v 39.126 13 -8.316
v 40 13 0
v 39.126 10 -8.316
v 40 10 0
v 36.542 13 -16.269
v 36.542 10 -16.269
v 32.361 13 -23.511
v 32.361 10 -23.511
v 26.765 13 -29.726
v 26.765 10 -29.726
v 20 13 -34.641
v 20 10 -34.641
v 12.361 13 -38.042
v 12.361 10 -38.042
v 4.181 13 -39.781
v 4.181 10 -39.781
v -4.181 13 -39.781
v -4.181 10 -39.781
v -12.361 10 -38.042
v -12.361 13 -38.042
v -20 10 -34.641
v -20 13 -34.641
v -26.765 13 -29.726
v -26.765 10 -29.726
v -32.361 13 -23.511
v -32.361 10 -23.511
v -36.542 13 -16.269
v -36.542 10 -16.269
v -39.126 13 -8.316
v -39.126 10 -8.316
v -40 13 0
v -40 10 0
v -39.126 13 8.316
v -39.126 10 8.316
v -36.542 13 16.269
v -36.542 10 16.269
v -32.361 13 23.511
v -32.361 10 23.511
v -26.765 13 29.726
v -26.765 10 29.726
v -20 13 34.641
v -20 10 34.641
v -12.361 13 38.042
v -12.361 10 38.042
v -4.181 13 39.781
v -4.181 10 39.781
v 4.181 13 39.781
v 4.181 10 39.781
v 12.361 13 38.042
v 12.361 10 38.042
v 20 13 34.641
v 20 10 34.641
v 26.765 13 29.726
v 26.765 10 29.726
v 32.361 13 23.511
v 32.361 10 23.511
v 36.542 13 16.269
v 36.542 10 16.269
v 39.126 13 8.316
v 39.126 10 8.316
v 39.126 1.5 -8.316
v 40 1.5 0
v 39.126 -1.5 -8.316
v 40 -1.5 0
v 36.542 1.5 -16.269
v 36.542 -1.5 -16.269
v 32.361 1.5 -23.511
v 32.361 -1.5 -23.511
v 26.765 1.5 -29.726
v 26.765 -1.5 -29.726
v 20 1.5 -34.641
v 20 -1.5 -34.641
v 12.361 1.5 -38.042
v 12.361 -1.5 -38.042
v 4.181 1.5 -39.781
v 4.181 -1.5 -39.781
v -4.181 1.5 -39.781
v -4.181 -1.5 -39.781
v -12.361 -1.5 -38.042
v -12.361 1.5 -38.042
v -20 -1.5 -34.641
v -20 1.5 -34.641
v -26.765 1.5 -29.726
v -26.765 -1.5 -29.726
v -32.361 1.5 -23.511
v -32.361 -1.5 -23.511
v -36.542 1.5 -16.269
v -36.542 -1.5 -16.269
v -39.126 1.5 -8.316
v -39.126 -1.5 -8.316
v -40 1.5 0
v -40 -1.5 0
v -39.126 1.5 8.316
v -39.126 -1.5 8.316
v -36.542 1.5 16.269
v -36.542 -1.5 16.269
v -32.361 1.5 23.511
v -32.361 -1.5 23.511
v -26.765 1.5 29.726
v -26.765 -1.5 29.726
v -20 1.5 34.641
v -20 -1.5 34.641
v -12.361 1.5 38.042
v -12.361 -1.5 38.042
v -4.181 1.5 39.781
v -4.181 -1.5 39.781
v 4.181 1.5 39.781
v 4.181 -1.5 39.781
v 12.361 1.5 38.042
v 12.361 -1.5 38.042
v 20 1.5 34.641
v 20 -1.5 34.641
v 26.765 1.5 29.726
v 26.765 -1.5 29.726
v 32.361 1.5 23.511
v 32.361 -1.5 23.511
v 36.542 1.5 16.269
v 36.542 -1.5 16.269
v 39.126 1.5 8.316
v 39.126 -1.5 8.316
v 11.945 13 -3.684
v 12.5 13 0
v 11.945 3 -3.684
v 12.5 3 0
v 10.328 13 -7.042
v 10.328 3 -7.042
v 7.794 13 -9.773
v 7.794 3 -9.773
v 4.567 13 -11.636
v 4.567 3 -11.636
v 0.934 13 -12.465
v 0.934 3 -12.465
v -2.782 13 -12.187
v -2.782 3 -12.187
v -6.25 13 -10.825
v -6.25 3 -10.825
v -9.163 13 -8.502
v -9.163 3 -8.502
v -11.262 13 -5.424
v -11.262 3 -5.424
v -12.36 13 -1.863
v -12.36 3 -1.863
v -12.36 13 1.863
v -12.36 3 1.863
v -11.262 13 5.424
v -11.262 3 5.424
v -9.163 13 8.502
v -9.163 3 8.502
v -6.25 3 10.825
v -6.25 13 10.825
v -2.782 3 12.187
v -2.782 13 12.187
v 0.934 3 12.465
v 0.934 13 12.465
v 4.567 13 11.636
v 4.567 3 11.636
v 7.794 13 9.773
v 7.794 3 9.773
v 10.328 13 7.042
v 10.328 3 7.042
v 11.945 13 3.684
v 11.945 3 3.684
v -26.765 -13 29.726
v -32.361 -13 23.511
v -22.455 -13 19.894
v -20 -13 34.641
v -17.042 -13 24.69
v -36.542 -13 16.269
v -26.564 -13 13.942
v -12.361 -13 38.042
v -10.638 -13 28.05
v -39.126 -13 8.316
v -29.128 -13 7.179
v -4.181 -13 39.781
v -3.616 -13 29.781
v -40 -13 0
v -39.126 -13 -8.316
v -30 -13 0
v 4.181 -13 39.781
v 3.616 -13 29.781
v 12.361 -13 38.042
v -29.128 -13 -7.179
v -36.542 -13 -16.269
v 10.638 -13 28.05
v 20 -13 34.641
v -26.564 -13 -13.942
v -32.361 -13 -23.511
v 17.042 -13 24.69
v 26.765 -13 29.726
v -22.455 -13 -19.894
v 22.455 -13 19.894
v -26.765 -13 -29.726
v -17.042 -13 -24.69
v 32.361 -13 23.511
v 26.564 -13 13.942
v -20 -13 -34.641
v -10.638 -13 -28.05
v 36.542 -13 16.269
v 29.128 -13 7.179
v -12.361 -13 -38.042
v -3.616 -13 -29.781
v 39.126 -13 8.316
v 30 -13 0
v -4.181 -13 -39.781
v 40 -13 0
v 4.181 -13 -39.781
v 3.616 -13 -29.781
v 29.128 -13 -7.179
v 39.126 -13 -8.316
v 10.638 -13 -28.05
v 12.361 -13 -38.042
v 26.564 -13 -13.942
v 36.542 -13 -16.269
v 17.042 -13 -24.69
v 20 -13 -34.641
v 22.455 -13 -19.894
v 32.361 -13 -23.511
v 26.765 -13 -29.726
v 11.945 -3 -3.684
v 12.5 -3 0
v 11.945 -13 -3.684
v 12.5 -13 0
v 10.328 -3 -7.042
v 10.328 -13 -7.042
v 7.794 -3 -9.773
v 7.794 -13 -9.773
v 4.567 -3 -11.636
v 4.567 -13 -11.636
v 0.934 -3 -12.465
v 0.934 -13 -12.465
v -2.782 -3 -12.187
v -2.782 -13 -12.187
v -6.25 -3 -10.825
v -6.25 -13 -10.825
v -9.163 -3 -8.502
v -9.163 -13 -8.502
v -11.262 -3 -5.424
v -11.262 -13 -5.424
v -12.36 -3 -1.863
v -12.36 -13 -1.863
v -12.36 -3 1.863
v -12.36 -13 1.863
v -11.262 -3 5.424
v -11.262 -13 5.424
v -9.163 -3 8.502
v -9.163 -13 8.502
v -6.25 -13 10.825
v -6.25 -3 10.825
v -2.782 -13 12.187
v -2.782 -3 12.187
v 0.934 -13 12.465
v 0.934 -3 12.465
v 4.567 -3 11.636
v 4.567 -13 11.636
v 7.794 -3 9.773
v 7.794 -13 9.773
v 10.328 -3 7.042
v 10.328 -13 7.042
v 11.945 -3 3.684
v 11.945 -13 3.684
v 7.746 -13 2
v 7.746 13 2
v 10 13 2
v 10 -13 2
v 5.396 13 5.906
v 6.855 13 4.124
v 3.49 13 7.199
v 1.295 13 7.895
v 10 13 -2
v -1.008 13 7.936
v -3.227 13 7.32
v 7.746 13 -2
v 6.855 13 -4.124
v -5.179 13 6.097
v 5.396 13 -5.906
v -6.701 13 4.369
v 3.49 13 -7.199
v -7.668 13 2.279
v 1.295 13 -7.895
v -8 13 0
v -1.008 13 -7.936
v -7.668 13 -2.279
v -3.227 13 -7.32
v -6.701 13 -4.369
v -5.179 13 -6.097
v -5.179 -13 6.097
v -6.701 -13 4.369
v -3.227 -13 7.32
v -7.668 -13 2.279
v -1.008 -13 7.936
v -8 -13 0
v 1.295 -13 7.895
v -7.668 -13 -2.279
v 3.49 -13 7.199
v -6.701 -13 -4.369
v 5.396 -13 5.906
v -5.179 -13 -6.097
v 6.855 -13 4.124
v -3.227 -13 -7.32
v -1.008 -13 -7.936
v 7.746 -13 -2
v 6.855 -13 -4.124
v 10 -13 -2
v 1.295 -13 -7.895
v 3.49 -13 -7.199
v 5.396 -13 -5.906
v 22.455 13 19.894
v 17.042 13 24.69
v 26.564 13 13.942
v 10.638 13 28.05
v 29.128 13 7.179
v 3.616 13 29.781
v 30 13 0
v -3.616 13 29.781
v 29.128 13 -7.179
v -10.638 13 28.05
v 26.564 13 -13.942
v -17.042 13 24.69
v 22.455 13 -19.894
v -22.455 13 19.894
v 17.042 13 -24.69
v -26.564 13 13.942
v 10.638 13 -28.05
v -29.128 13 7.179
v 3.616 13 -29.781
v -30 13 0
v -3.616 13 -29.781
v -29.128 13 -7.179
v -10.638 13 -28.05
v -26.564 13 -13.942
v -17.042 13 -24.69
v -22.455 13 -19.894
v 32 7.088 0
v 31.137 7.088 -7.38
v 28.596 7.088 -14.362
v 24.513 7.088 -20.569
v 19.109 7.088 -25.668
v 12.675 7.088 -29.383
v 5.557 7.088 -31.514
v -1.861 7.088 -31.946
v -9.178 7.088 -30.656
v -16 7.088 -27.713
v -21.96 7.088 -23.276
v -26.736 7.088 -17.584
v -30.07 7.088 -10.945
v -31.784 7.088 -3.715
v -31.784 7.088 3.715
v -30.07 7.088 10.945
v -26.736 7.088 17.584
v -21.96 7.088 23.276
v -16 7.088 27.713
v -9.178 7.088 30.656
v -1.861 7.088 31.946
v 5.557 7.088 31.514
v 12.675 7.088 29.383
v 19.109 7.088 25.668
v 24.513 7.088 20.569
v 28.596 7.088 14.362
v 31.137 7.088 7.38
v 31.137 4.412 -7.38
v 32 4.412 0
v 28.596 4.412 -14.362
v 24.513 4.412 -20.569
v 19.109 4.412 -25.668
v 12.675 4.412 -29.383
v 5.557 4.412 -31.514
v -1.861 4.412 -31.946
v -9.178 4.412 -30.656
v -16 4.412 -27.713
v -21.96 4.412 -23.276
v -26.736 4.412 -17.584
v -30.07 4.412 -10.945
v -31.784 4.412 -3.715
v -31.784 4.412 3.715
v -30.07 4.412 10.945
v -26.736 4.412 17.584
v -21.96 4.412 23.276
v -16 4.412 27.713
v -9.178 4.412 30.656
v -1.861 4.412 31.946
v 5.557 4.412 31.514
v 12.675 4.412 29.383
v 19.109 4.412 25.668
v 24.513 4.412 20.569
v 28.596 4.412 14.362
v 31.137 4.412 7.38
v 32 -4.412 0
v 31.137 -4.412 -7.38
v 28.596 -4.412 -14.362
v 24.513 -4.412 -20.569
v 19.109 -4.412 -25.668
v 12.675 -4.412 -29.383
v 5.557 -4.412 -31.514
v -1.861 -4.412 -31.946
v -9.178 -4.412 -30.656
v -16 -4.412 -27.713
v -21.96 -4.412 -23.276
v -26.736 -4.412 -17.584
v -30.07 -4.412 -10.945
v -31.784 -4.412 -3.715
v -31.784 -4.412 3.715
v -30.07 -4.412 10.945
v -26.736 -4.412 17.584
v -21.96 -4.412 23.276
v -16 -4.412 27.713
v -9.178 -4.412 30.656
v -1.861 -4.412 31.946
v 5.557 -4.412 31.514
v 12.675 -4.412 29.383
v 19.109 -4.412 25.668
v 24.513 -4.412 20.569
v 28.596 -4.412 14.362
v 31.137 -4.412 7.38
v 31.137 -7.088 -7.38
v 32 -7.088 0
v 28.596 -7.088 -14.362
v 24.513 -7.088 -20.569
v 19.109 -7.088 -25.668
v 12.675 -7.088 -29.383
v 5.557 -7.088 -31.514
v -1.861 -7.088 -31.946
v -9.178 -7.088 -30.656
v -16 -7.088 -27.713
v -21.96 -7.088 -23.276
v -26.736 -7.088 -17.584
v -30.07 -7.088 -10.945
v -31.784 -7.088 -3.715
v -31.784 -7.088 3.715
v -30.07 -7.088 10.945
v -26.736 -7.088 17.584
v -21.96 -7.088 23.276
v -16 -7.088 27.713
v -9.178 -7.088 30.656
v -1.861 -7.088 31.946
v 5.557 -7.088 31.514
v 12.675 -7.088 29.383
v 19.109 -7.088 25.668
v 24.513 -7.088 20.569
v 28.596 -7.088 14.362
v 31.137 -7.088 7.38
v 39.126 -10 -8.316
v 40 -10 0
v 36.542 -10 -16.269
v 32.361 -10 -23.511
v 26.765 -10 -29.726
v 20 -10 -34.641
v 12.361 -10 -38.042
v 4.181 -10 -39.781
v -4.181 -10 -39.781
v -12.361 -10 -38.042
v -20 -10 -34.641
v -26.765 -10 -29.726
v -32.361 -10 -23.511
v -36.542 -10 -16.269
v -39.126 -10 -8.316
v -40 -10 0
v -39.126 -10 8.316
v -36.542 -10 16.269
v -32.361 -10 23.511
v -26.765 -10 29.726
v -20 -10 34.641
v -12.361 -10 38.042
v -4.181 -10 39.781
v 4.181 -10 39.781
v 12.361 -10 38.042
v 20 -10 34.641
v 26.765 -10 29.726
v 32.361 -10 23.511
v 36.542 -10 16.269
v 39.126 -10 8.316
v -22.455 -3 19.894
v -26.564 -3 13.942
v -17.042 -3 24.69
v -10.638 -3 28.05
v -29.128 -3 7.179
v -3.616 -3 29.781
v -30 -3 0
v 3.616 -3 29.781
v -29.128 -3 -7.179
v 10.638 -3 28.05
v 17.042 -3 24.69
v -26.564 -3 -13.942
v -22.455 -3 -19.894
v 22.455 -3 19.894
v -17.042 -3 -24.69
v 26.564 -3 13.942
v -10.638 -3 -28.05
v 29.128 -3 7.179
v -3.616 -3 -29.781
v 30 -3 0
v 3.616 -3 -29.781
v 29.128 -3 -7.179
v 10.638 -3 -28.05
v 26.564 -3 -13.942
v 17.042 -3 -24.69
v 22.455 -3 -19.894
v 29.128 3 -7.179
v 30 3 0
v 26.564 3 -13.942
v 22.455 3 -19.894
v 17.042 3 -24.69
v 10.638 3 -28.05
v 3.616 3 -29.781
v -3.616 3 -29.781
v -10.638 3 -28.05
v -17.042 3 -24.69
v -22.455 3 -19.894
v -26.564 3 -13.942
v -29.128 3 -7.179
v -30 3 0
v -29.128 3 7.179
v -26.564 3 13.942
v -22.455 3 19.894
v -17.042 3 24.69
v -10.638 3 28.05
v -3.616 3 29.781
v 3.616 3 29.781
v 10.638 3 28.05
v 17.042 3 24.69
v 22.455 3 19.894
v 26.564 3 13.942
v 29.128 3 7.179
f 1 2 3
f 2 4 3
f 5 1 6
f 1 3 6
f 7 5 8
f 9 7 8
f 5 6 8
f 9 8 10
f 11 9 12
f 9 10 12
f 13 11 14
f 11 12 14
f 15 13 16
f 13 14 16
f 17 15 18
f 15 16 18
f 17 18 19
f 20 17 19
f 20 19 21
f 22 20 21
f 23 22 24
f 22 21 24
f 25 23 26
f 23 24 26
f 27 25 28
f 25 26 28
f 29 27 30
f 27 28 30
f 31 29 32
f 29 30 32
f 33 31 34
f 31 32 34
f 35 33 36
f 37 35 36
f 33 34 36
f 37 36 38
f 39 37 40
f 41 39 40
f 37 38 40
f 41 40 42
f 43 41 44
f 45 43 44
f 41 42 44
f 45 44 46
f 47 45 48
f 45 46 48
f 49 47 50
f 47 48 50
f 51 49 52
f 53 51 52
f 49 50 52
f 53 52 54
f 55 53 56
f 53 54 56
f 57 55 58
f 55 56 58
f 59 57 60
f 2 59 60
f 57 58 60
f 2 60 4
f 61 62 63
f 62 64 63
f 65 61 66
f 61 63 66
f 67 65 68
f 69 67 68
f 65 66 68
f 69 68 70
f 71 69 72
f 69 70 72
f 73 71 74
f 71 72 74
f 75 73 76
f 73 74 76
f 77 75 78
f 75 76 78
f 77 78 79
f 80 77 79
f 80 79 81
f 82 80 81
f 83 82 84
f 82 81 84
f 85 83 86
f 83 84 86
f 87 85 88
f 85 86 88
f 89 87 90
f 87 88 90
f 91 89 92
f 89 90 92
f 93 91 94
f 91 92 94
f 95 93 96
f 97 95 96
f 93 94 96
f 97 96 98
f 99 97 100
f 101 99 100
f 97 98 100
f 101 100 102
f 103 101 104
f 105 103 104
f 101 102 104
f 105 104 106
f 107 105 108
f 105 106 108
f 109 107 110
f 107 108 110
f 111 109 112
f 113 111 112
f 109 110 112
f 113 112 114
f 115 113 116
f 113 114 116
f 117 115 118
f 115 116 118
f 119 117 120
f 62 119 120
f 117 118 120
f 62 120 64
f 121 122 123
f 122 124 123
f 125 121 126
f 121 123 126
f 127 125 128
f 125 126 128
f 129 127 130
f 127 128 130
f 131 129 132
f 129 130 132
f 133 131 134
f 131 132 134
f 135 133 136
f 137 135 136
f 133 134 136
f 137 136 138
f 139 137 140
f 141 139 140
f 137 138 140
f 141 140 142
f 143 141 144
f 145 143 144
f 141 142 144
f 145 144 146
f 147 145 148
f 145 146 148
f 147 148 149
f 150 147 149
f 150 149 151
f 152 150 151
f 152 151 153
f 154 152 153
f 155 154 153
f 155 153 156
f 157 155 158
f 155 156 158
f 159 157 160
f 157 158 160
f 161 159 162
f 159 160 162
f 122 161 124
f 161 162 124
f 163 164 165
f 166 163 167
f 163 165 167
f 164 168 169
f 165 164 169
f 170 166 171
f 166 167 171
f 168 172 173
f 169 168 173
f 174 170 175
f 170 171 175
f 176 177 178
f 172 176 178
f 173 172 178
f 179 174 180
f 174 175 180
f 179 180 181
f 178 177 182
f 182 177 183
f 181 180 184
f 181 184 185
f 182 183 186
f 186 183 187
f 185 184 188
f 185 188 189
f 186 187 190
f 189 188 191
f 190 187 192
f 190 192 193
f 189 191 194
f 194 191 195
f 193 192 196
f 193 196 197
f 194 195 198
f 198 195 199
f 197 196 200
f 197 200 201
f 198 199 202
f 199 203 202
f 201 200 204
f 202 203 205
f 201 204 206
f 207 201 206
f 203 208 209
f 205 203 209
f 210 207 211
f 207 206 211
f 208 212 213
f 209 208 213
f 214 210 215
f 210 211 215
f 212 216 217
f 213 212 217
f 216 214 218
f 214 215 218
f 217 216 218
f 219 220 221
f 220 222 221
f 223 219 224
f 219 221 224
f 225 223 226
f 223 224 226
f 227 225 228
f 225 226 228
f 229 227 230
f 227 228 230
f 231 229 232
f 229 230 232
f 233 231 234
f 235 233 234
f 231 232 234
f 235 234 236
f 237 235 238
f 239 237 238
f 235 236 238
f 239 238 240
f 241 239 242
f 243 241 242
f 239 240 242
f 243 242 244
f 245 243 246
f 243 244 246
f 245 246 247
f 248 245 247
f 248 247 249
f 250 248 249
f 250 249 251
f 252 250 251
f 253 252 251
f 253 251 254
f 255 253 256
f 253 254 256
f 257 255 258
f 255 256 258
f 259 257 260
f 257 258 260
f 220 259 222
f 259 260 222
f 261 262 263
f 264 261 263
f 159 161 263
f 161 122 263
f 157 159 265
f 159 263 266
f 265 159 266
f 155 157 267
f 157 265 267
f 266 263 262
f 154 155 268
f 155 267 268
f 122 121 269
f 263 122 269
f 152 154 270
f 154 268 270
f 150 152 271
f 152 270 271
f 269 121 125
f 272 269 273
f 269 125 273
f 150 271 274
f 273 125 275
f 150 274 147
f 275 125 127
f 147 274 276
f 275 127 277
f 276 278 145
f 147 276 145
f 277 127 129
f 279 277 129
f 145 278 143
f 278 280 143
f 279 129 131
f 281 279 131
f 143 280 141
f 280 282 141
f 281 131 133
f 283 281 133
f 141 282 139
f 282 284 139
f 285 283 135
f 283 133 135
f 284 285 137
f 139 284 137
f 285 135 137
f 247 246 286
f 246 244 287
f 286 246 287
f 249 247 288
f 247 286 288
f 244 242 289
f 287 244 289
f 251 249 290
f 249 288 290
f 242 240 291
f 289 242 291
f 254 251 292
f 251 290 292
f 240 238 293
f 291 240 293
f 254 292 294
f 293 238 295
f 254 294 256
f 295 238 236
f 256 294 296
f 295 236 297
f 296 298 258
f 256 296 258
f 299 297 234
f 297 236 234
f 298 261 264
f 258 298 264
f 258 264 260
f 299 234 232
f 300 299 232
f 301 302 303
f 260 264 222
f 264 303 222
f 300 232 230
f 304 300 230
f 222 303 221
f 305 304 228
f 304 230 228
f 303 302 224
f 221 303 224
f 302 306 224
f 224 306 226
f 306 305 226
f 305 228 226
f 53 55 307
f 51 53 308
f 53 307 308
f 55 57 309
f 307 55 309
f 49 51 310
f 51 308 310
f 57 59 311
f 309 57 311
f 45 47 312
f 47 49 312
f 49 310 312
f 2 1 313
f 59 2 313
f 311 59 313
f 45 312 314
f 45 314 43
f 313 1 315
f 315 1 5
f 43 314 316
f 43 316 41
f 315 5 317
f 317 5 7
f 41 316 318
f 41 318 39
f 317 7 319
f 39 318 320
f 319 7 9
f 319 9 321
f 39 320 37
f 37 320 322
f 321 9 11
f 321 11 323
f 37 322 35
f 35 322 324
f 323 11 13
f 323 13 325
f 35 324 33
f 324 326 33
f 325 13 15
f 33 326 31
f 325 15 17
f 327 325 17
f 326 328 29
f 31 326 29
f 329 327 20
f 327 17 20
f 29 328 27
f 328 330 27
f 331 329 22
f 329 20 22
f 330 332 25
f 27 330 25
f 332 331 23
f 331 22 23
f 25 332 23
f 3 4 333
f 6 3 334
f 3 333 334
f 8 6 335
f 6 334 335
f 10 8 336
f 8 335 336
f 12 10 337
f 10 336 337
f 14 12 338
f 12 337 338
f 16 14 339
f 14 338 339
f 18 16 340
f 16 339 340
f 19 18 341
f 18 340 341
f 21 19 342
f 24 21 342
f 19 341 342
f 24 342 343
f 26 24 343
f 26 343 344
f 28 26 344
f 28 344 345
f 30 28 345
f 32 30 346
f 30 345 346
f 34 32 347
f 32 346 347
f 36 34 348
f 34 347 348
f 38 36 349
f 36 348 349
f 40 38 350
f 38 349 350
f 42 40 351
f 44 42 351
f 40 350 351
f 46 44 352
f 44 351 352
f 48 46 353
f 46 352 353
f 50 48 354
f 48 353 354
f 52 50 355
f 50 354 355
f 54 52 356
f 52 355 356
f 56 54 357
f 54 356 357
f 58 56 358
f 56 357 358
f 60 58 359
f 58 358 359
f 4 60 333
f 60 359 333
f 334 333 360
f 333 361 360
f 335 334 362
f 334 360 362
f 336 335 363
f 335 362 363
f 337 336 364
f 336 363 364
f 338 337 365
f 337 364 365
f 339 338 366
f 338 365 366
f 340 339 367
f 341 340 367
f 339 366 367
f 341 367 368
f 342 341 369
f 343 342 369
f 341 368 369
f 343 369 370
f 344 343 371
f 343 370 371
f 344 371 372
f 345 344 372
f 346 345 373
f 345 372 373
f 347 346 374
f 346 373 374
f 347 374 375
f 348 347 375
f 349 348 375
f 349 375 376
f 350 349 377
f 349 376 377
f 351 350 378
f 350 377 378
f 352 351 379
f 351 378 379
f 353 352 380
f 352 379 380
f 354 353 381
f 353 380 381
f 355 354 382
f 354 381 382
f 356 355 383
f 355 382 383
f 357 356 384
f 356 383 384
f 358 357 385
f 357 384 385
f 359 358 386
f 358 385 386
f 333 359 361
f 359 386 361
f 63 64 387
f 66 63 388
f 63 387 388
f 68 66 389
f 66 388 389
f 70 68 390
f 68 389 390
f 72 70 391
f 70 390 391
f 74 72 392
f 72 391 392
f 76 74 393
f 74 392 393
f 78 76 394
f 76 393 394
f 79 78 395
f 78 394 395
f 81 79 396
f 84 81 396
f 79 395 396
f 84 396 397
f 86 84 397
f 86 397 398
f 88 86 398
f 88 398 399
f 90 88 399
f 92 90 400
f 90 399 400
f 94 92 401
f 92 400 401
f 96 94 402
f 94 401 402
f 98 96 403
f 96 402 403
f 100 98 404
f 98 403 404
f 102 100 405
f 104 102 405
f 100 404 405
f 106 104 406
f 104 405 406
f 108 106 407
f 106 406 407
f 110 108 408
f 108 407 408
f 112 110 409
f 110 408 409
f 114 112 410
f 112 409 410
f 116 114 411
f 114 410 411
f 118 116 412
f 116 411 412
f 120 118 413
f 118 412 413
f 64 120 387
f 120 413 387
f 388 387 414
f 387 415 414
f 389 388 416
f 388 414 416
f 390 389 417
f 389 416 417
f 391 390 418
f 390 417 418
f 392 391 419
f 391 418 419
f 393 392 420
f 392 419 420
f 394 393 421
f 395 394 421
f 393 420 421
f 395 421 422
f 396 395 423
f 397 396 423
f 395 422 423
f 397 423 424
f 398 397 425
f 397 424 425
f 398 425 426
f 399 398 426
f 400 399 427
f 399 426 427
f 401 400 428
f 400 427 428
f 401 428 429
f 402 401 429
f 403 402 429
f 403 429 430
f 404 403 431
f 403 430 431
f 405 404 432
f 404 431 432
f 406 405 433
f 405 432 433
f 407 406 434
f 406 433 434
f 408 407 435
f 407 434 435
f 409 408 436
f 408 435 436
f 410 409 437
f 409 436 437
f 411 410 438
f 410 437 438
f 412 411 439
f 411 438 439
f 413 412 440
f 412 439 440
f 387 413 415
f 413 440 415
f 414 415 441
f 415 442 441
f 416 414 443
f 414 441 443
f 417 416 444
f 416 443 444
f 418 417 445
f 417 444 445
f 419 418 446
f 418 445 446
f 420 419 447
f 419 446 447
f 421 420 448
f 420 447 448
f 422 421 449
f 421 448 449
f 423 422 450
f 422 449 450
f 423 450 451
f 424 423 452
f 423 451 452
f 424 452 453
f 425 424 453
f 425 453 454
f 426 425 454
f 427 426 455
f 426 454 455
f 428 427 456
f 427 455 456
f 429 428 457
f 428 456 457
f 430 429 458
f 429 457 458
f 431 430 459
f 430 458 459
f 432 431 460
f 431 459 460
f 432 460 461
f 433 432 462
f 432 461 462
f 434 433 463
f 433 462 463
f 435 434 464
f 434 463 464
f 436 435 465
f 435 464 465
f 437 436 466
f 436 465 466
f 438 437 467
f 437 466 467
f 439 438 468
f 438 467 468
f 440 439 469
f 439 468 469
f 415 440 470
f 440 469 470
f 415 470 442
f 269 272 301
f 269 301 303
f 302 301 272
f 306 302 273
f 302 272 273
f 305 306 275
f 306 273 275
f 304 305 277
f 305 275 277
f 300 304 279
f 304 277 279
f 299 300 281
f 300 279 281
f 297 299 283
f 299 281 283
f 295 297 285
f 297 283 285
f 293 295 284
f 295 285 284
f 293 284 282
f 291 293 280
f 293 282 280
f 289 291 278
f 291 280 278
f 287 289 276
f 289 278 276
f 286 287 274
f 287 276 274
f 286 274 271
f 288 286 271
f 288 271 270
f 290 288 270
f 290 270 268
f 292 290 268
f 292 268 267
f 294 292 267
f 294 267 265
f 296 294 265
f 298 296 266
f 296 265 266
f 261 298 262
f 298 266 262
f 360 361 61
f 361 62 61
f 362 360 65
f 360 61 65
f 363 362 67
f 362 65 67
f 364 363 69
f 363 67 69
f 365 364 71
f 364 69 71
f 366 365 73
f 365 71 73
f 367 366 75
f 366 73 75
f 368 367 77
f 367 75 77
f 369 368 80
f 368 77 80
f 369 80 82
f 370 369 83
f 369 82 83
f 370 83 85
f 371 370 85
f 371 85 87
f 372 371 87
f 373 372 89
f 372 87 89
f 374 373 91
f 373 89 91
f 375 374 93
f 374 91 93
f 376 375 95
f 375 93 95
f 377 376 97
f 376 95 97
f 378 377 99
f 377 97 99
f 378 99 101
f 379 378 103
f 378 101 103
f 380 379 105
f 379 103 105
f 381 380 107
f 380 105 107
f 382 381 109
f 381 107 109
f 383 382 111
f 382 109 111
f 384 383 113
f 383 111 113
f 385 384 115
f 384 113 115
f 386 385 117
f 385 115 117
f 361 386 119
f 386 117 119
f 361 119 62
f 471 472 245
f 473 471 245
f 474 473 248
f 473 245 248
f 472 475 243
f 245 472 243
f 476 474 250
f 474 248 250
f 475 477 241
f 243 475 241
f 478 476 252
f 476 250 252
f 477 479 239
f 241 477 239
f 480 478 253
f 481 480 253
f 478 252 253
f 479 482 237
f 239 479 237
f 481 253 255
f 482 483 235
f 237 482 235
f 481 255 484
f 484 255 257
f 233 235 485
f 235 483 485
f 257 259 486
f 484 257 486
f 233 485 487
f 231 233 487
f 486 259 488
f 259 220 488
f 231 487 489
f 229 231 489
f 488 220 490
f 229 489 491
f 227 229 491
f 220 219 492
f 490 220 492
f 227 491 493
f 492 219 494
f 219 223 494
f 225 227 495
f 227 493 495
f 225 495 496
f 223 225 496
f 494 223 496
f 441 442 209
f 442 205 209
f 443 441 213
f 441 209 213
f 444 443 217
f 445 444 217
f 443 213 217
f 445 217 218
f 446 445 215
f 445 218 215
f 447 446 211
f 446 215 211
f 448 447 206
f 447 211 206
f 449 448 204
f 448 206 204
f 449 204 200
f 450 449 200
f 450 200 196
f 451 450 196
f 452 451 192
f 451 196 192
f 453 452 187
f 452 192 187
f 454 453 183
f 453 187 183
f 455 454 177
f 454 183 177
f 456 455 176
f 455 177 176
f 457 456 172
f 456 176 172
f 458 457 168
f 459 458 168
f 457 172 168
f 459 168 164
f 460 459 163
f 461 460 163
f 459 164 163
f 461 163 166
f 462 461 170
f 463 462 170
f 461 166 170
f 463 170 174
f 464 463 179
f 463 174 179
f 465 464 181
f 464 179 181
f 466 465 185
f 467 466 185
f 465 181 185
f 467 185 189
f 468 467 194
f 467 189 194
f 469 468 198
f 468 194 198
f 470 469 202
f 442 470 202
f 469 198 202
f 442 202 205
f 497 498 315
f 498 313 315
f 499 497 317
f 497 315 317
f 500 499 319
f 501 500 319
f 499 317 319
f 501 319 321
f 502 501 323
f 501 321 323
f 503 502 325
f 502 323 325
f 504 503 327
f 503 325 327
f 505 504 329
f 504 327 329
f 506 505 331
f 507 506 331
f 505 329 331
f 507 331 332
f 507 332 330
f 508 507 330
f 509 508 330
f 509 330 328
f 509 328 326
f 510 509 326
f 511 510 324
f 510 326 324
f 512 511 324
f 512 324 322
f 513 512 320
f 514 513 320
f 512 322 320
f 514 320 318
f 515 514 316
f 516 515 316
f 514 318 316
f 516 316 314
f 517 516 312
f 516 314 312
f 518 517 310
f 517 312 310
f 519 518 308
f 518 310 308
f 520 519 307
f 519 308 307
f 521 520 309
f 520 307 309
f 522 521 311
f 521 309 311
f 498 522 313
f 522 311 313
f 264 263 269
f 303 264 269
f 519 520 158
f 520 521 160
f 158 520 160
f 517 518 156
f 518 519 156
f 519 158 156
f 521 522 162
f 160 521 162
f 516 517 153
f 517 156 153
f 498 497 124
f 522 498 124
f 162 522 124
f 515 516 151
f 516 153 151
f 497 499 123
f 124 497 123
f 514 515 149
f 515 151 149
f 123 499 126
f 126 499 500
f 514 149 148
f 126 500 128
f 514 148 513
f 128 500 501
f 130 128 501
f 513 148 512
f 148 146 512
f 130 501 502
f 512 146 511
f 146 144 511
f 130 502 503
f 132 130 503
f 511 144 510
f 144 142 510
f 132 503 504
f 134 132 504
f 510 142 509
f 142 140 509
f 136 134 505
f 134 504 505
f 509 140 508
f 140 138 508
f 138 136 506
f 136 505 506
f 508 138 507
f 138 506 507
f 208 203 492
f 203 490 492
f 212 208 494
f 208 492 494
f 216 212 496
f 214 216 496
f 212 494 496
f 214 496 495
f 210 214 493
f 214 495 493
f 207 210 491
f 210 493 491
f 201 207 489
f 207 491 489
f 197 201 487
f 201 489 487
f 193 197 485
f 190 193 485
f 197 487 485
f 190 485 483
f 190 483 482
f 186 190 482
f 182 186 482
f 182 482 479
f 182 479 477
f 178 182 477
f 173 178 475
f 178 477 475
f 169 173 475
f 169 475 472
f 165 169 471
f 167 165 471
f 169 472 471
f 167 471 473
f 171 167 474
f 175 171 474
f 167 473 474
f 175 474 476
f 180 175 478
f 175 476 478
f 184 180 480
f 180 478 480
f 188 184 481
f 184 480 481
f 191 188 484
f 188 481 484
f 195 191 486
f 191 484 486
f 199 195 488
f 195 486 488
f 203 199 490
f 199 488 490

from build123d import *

# Parameters (mm, degrees)
SKETCH_2_W          = 10
SKETCH_2_H          = 4
CUT_EXTRUDE_1_DEPTH = 27


with BuildPart() as part:
    # 草圖1 → 旋轉1 (revolve)
    with BuildSketch(Plane.XY):
        Polygon((30, -13), (30, -3), (12.5, -3), (12.5, -13), (8, -13), (8, 13), (12.5, 13), (12.5, 3), (30, 3), (30, 13), (40, 13), (40, 10), (32, 7.088238126), (32, 4.411761874), (40, 1.5), (40, -1.5), (32, -4.411761874), (32, -7.088238126), (40, -10), (40, -13), align=None)
    revolve(axis=Axis((0, 0, 0), (0, 1, 0)))

    # 草圖2 → 除料-伸長1 (cut, through all)
    with BuildSketch(Plane(origin=(0, 13, 0), x_dir=(1, 0, 0), z_dir=(0, 1, 0))):
        with Locations((5, 0)):
            Rectangle(SKETCH_2_W, SKETCH_2_H)
    extrude(amount=-CUT_EXTRUDE_1_DEPTH, mode=Mode.SUBTRACT)


solid = part.part
